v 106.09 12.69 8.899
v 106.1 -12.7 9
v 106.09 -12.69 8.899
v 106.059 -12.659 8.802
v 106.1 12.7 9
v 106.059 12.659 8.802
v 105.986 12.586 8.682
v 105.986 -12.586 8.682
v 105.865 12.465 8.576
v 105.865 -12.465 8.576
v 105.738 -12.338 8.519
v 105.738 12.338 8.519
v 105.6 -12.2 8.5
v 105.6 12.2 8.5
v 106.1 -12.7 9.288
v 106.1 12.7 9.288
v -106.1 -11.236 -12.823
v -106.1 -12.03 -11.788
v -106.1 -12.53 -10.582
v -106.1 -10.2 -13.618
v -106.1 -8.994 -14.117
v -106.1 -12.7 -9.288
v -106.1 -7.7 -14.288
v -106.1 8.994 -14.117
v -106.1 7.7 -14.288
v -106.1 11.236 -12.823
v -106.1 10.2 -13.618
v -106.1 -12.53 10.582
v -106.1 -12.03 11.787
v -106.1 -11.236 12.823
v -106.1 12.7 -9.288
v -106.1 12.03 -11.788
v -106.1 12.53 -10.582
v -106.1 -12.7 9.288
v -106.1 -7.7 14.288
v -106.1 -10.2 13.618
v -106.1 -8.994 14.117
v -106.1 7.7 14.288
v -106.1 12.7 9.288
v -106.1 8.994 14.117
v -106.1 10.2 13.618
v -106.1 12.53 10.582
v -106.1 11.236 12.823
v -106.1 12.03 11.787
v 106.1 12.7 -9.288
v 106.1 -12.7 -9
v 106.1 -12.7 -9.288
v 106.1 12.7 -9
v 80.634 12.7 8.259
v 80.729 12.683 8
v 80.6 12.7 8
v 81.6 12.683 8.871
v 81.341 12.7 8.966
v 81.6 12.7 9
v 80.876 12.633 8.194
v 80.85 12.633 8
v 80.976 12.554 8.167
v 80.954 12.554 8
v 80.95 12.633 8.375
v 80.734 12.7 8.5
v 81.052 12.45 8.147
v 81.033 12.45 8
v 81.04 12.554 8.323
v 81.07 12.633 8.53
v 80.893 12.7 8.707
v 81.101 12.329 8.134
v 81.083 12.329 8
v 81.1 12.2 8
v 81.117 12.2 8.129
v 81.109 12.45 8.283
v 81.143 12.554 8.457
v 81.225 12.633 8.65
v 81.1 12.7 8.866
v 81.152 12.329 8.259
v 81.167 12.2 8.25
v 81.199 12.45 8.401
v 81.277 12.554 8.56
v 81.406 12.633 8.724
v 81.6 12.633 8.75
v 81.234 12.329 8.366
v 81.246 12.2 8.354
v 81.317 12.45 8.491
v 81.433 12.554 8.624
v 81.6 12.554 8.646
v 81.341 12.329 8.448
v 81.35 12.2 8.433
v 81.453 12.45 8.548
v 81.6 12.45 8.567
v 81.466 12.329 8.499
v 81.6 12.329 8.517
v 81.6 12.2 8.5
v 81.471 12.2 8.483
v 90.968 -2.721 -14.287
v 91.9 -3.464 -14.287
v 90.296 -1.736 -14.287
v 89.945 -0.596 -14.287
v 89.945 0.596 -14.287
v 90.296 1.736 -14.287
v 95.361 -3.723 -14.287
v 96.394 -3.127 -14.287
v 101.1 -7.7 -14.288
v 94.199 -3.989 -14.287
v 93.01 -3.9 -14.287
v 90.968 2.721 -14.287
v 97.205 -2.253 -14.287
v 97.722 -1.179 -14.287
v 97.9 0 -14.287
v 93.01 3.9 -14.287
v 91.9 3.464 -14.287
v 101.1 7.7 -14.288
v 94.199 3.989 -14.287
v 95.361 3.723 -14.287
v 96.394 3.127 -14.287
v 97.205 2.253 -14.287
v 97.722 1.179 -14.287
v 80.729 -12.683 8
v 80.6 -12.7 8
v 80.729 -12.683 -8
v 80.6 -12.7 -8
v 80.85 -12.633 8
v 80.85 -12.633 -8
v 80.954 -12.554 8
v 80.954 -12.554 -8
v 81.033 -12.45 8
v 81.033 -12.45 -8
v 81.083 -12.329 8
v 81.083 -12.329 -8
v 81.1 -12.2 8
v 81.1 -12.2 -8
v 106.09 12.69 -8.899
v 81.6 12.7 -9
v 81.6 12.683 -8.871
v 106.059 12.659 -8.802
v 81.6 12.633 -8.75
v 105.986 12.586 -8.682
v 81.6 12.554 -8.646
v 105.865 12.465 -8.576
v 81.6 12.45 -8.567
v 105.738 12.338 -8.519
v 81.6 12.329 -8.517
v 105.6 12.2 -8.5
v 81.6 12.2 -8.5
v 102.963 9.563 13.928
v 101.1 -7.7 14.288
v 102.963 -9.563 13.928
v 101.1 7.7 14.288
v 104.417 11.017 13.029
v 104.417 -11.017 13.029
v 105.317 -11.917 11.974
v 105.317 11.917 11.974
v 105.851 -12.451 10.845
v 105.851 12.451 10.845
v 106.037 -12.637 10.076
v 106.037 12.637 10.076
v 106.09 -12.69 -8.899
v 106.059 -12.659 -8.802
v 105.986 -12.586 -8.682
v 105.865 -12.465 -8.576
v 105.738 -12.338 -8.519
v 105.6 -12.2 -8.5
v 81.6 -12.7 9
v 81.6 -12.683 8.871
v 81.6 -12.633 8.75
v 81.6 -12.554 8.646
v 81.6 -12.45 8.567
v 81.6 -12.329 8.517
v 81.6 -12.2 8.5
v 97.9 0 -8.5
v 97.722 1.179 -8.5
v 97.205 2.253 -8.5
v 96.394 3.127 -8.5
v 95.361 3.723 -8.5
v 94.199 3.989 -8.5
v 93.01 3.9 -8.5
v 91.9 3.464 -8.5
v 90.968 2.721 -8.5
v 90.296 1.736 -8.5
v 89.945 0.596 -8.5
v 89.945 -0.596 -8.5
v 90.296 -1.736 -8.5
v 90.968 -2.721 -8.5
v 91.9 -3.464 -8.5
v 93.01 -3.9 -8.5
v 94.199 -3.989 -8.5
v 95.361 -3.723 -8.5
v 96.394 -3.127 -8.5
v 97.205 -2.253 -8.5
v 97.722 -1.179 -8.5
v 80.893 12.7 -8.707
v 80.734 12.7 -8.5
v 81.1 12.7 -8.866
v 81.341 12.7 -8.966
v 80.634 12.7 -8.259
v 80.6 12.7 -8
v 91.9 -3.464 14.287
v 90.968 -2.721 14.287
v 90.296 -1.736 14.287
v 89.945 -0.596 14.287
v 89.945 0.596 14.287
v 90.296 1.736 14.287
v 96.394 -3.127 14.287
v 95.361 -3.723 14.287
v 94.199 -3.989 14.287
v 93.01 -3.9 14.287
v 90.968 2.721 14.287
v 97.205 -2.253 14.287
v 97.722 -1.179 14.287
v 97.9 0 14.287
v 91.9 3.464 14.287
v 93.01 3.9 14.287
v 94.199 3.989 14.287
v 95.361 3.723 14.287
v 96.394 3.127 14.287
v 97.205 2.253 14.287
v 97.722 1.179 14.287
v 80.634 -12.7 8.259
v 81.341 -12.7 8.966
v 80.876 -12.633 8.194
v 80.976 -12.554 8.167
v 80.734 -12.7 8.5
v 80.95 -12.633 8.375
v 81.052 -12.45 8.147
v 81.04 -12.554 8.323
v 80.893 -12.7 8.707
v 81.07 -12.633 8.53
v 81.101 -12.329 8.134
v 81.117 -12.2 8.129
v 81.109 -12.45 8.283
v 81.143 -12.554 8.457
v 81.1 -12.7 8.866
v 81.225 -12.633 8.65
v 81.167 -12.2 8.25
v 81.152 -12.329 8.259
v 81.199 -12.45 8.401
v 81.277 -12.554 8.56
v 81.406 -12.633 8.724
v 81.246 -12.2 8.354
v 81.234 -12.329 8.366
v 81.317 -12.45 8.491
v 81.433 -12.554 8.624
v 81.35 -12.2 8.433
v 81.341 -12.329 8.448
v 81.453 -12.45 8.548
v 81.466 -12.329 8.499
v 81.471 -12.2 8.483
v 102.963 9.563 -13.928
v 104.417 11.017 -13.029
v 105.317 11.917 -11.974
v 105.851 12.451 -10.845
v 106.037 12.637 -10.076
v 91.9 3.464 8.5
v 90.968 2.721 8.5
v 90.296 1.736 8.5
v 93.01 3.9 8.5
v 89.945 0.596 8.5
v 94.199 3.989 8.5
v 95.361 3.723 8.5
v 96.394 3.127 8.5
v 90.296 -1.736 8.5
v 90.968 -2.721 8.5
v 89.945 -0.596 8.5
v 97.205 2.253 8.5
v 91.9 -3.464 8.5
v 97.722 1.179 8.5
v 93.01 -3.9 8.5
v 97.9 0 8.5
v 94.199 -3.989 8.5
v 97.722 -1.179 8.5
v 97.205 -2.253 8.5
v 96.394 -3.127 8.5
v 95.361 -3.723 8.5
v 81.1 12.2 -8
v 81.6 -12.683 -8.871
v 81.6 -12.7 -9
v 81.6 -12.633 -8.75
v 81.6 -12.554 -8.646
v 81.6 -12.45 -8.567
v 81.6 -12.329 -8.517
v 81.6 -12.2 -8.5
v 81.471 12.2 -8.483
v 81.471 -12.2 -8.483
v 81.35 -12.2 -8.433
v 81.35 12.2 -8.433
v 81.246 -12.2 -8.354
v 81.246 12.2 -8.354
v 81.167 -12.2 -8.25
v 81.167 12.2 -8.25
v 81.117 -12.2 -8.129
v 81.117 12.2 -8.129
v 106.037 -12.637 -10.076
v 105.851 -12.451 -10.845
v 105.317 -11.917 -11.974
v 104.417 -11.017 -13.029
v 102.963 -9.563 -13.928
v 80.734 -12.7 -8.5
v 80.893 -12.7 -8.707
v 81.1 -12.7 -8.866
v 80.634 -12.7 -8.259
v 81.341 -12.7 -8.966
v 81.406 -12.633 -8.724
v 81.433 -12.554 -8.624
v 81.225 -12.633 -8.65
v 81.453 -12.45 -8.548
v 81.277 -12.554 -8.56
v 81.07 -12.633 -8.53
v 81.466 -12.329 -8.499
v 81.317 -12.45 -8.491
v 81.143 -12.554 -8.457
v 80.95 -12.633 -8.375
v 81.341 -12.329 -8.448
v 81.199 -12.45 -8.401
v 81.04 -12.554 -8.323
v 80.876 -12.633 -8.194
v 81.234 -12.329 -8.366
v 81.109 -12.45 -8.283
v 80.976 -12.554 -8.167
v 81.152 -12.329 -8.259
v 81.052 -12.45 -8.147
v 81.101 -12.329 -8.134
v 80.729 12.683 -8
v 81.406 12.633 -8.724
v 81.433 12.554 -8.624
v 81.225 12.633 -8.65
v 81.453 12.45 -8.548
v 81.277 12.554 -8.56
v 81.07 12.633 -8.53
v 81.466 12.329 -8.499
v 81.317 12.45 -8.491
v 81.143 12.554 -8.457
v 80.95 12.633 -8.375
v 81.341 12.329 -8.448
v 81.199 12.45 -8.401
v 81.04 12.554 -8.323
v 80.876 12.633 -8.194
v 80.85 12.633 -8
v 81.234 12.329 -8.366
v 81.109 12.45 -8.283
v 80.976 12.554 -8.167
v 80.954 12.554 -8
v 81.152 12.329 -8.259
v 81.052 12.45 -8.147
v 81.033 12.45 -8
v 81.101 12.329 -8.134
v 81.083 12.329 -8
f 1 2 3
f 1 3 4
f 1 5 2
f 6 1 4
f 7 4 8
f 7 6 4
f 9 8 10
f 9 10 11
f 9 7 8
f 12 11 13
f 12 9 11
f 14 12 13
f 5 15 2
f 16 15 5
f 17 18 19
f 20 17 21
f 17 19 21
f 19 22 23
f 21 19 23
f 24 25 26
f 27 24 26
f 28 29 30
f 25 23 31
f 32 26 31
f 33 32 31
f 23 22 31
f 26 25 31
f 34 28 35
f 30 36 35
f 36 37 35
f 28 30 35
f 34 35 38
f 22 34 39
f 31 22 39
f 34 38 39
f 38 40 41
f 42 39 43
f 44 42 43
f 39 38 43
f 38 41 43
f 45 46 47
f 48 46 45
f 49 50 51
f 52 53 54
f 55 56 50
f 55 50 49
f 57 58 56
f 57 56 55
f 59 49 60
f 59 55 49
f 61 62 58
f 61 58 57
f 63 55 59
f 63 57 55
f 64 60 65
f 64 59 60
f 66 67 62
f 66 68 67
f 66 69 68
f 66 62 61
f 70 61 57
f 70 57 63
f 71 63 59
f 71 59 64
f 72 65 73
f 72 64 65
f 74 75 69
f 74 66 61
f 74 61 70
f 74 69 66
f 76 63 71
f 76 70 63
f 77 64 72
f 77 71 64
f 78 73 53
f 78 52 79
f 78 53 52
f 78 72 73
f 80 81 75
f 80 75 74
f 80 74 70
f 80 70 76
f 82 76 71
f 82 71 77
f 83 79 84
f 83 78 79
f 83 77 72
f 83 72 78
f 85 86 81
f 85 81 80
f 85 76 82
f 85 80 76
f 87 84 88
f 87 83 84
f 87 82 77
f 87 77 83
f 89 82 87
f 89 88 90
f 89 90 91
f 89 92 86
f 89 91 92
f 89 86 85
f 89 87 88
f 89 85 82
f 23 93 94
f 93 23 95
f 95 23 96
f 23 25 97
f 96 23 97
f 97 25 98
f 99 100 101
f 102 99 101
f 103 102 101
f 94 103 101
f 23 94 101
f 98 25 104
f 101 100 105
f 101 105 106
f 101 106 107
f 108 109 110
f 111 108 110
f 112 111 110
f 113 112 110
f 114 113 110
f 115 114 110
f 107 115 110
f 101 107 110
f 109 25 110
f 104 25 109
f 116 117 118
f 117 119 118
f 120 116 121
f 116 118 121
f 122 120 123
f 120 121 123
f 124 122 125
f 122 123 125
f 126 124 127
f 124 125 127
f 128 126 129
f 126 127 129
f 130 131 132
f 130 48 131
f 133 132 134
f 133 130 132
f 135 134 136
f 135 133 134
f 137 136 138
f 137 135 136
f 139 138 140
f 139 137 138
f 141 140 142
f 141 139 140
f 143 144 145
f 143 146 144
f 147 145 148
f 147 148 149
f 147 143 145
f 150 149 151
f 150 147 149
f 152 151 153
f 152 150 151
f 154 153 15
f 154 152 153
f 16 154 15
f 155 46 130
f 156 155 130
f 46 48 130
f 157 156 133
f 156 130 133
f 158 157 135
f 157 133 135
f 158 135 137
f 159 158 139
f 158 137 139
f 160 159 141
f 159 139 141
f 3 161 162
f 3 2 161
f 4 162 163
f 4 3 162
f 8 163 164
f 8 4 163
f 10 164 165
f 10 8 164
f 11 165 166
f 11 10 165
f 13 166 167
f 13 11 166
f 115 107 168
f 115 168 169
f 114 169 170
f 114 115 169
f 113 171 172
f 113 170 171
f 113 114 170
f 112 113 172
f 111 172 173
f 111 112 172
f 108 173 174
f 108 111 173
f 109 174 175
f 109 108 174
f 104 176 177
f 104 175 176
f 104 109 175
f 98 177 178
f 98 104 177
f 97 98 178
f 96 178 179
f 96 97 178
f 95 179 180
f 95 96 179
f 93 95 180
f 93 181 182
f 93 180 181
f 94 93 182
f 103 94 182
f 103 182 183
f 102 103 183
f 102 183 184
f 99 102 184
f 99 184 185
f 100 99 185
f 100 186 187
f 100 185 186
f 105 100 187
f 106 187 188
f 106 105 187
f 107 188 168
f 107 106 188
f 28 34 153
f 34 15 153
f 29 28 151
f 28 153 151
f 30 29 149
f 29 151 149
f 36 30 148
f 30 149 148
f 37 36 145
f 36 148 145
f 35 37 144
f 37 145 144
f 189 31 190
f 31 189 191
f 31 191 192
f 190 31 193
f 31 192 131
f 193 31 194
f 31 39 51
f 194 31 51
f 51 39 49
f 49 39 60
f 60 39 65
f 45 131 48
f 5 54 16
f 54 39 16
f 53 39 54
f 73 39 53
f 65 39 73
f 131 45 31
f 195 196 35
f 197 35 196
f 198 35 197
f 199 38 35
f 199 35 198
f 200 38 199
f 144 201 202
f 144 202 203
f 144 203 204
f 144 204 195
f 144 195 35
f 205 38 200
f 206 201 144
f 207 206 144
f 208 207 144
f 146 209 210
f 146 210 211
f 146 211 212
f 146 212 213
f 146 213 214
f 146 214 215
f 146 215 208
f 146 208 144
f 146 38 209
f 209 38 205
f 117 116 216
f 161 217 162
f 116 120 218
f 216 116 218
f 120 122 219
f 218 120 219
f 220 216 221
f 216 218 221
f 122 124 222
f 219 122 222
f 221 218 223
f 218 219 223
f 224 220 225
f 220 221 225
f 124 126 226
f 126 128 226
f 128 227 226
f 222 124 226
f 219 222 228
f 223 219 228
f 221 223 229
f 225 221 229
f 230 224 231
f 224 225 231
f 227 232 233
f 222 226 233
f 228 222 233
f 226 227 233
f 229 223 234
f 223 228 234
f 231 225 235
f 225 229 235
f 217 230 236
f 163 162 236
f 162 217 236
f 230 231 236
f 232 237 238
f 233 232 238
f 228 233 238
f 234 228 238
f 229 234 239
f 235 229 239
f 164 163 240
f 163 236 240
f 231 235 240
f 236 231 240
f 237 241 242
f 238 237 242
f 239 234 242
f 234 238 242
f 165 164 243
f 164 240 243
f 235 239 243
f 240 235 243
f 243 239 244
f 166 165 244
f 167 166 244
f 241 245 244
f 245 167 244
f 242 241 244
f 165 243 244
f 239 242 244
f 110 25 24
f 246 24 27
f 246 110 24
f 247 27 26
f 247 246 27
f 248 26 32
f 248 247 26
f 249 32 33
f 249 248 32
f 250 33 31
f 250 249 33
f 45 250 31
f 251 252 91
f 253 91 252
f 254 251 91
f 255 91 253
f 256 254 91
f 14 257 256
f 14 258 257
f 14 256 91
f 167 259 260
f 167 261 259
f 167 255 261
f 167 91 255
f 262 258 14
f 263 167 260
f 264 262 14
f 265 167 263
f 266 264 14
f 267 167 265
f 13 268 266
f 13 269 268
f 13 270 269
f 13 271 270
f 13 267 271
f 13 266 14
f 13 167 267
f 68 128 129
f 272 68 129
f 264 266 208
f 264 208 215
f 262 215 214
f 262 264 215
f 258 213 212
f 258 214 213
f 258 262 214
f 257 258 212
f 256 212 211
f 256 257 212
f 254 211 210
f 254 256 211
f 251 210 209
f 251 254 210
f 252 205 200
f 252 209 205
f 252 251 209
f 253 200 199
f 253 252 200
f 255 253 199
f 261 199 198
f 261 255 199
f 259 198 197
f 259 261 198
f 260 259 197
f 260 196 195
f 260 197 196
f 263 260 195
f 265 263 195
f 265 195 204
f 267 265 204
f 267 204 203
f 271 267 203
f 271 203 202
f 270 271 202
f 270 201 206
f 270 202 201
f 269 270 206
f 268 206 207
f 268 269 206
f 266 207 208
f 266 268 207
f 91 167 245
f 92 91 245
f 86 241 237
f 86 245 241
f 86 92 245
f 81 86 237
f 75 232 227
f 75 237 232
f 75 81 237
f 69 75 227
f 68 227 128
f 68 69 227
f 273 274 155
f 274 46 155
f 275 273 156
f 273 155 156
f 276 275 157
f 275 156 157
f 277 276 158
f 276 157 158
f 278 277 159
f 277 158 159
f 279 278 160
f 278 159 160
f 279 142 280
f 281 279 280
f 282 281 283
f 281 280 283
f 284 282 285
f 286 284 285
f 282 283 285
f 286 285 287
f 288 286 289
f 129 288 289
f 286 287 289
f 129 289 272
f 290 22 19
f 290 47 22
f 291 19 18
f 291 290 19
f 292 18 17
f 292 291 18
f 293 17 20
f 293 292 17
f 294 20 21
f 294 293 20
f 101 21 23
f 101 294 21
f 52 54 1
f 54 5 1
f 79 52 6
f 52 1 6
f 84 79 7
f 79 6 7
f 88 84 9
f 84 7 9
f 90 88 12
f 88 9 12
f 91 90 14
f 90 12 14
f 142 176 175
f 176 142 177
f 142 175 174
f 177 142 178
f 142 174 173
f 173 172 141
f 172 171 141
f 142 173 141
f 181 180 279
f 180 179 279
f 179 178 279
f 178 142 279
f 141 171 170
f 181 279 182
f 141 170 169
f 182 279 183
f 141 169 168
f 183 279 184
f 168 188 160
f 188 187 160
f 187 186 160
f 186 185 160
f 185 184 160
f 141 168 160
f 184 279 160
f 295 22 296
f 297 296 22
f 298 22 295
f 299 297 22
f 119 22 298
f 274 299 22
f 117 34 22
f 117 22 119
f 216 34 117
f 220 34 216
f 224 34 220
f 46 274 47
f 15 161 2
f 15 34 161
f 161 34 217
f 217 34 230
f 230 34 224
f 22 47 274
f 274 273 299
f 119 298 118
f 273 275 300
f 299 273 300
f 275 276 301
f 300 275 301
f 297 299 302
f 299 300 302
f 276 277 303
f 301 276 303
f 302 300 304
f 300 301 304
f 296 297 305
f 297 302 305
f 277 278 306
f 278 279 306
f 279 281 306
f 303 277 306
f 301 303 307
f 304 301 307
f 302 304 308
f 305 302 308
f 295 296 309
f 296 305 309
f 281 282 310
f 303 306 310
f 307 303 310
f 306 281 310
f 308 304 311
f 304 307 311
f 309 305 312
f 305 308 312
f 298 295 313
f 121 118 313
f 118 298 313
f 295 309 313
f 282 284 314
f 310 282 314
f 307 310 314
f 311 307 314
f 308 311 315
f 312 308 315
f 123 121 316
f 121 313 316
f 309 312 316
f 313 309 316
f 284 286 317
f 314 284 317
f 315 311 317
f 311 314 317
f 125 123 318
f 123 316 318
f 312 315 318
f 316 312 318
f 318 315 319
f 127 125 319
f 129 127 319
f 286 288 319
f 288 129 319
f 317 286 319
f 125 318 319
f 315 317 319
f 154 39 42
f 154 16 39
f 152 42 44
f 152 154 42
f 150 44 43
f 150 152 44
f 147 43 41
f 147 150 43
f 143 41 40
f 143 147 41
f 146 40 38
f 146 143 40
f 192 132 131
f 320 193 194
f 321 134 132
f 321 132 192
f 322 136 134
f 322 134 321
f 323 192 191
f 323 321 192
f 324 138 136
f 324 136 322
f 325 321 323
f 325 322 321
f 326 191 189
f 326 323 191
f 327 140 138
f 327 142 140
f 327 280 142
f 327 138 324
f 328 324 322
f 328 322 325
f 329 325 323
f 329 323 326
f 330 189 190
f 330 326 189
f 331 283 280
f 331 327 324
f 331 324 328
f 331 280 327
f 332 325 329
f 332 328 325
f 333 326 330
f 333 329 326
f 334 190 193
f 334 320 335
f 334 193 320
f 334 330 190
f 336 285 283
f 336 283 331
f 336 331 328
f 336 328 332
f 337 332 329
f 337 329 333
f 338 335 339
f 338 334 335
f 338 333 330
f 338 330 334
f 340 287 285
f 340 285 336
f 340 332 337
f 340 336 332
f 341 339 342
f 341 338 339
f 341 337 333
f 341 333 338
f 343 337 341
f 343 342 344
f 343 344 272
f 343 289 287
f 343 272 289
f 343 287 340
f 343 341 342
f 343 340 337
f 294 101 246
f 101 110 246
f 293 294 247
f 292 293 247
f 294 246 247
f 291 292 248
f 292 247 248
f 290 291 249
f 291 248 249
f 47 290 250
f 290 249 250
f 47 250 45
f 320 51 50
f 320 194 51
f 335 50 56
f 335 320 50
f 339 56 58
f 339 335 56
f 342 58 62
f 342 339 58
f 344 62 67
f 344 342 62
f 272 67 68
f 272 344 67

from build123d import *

# Parameters (mm, degrees)
SKETCH1_W               = 212.2
SKETCH1_H               = 25.4
BOSS_EXTRUDE1_DEPTH     = 14.2875
CUT_EXTRUDE2_DEPTH      = 108.808314412
CUT_EXTRUDE2_DEPTH_BACK = 108.808314412
SKETCH2_R               = 4
CUT_EXTRUDE3_DEPTH      = 108.808314412
CUT_EXTRUDE3_DEPTH_BACK = 108.808314412
SKETCH3_W               = 25
SKETCH3_H               = 17
FILLET3_R               = 5
FILLET4_R               = 0.5


with BuildPart() as part:
    # Sketch1 → Boss-Extrude1 (new, symmetric)
    with BuildSketch(Plane.XY):
        Rectangle(SKETCH1_W, SKETCH1_H)
    extrude(amount=BOSS_EXTRUDE1_DEPTH, both=True)

    # Sketch2 → Cut-Extrude2 (cut, two sides: drawn at the far end of the back side and taken through both)
    with BuildSketch(Plane.XY.offset(-CUT_EXTRUDE2_DEPTH_BACK)):
        with Locations((93.9, 0)):
            Circle(SKETCH2_R)
    extrude(amount=CUT_EXTRUDE2_DEPTH + CUT_EXTRUDE2_DEPTH_BACK, mode=Mode.SUBTRACT)

    # Sketch3 → Cut-Extrude3 (cut, two sides: drawn at the far end of the back side and taken through both)
    with BuildSketch(Plane(origin=(0, 0, 0), x_dir=(1, 0, 0), z_dir=(0, 1, 0)).offset(-CUT_EXTRUDE3_DEPTH_BACK)):
        with Locations((93.6, 0)):
            Rectangle(SKETCH3_W, SKETCH3_H)
    extrude(amount=CUT_EXTRUDE3_DEPTH + CUT_EXTRUDE3_DEPTH_BACK, mode=Mode.SUBTRACT)

    # Fillet3
    fillet3_edges = [part.edges().sort_by_distance(p)[0] for p in [
        (106.1, 0, 14.2875),
        (0, 12.7, 14.2875),
        (0, 12.7, -14.2875),
        (106.1, 0, -14.2875),
        (0, -12.7, -14.2875),
        (0, -12.7, 14.2875),
    ]]
    fillet(fillet3_edges, radius=FILLET3_R)

    # Fillet4
    fillet4_edges = [part.edges().sort_by_distance(p)[0] for p in [
        (106.1, 0, 8.5),
        (93.6, -12.7, 8.5),
        (81.1, 0, -8.5),
        (93.6, -12.7, -8.5),
        (106.1, 0, -8.5),
        (81.1, 0, 8.5),
        (81.1, -12.7, 0),
        (93.6, 12.7, -8.5),
        (81.1, 12.7, 0),
        (93.6, 12.7, 8.5),
    ]]
    fillet(fillet4_edges, radius=FILLET4_R)


solid = part.part
